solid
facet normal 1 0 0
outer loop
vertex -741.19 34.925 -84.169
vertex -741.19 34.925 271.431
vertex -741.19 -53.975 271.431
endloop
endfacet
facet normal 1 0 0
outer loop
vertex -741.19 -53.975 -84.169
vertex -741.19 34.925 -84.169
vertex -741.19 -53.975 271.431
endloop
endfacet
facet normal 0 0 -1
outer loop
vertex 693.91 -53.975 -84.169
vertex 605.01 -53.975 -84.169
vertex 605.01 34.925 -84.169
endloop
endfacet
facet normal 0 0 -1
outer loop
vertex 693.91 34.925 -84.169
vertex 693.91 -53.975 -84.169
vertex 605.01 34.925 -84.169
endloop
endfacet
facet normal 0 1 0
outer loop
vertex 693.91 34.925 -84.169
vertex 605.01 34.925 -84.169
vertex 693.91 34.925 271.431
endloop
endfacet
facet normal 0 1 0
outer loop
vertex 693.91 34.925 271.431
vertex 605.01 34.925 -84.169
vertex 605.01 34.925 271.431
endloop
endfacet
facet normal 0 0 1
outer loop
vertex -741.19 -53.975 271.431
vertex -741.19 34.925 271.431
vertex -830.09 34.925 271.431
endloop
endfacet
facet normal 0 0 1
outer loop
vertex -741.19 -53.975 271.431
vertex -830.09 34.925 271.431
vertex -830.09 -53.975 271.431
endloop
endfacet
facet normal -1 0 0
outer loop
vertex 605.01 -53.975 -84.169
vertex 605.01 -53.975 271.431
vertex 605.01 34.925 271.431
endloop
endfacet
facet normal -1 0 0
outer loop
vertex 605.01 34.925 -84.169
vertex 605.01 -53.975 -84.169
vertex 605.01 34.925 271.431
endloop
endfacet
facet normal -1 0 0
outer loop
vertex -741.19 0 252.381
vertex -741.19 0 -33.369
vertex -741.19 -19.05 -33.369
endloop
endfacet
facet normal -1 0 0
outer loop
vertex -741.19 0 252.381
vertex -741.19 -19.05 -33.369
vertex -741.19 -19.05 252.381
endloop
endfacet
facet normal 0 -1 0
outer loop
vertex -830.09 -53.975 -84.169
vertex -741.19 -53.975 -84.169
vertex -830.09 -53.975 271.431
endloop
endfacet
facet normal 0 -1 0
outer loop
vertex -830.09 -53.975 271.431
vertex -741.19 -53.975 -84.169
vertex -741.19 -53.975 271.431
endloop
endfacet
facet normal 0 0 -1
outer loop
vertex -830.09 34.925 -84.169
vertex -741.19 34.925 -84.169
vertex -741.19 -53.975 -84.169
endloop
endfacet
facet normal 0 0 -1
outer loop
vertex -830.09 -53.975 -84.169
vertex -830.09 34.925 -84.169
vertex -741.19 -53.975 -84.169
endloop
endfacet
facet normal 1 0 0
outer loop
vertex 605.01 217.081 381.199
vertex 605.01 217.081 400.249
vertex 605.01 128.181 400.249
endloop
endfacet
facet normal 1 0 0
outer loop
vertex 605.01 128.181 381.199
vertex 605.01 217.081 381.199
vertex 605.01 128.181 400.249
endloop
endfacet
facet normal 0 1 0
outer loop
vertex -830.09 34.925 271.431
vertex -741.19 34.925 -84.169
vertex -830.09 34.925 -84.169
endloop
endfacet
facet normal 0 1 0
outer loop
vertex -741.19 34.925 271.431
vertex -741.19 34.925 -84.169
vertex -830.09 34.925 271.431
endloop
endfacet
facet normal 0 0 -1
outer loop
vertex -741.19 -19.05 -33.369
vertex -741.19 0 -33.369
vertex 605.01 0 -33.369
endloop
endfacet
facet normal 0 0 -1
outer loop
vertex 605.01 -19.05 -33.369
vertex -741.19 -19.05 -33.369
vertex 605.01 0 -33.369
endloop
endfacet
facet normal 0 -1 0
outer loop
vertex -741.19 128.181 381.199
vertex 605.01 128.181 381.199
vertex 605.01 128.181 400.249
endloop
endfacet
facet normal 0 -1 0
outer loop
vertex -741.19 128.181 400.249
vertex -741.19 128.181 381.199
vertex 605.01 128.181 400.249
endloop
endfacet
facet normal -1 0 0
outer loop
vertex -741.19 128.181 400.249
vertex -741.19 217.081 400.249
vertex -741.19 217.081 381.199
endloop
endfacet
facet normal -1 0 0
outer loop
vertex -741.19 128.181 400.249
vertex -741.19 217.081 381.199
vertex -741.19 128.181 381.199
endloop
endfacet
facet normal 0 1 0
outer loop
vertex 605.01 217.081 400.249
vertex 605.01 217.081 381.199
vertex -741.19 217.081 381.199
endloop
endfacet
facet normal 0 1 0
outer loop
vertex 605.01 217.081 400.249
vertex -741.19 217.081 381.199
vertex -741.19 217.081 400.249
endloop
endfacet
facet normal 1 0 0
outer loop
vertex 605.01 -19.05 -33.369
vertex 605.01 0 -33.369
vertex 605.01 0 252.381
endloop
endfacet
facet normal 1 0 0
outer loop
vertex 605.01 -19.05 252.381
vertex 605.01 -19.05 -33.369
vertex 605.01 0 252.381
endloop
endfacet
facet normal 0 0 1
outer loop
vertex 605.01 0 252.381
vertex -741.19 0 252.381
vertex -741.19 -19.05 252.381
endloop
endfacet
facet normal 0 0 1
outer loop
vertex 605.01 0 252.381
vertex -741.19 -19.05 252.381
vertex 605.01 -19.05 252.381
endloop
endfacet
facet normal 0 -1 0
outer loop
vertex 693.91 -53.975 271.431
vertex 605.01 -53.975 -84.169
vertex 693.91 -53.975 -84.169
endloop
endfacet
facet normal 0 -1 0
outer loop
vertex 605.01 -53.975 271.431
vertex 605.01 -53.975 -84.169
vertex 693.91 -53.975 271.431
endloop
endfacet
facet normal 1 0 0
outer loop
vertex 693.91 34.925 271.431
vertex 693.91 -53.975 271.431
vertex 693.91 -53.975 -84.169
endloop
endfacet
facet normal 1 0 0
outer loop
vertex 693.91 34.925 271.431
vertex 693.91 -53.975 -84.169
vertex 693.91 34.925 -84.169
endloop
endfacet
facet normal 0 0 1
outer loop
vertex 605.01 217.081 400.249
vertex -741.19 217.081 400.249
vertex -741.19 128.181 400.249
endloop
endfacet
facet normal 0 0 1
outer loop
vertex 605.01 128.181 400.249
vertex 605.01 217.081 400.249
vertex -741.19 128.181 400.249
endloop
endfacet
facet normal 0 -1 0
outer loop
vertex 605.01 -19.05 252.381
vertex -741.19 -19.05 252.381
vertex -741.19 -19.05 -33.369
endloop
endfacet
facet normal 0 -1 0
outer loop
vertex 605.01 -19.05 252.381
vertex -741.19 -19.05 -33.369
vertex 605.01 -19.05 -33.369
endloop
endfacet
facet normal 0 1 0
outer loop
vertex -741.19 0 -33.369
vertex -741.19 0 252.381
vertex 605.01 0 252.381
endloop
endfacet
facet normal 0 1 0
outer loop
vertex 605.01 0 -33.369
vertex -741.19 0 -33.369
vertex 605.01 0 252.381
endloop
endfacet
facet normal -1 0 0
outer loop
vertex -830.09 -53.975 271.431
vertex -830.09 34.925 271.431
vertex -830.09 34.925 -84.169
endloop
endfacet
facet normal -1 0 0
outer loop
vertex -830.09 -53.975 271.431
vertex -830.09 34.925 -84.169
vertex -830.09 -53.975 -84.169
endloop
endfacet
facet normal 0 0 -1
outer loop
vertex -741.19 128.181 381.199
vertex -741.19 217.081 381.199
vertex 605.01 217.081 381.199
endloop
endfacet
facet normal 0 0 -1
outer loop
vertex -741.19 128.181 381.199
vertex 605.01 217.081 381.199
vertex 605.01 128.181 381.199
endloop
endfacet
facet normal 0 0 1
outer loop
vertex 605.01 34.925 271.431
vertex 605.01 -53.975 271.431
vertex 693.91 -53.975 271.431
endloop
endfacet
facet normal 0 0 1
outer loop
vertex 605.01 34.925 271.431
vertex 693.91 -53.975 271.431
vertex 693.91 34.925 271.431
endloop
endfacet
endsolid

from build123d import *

# Parameters (mm, degrees)
F0_W     = 1346.2
F0_H     = 285.75
F1_DEPTH = 19.05
F2_W     = 88.9
F2_H     = 355.6
F3_DEPTH = 88.9
F4_W     = 88.9
F4_H     = 355.6
F5_DEPTH = 88.9
F6_W     = 88.9
F6_H     = 19.05
F7_DEPTH = 1346.2


with BuildPart() as f1:
    # F0 (on Front) → F1 (new body)
    with BuildSketch(Plane.XZ):
        with Locations((-68.090189, 109.505653)):
            Rectangle(F0_W, F0_H)
    extrude(amount=F1_DEPTH)


with BuildPart() as f3:
    # F2 (on face) → F3 (new body)
    with BuildSketch(Plane(origin=(-741.190189, 0, 0), x_dir=(0, -1, 0), z_dir=(-1, 0, 0))):
        with Locations((9.525, 93.630653)):
            Rectangle(F2_W, F2_H)
    extrude(amount=F3_DEPTH)


with BuildPart() as f5:
    # F4 (on face) → F5 (new body)
    with BuildSketch(Plane.YZ.offset(605.009811)):
        with Locations((-9.525, 93.630653)):
            Rectangle(F4_W, F4_H)
    extrude(amount=F5_DEPTH)


with BuildPart() as f7:
    # F6 (on face) → F7 (new body, through all)
    with BuildSketch(Plane(origin=(605.009811, 0, 0), x_dir=(0, -1, 0), z_dir=(-1, 0, 0))):
        with Locations((-172.631402, 390.72405)):
            Rectangle(F6_W, F6_H)
    extrude(amount=F7_DEPTH)


solid = Compound([f1.part, f3.part, f5.part, f7.part])
